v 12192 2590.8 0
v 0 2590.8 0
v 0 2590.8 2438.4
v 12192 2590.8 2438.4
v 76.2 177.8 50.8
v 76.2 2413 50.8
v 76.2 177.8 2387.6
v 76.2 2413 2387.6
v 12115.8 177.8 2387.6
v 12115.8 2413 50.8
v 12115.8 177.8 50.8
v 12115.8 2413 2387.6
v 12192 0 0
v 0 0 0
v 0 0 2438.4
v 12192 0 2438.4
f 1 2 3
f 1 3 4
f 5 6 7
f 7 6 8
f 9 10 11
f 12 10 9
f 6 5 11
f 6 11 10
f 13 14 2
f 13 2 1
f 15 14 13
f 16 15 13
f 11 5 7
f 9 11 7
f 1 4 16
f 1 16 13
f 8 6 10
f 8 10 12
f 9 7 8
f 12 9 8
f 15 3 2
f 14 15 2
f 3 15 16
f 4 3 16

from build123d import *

# Parameters (mm, degrees)
SKETCH1_W           = 12192
SKETCH1_H           = 2438.4
BOSS_EXTRUDE1_DEPTH = 2590.8
SKETCH2_W           = 2336.8
SKETCH2_H           = 2235.2
CUT_EXTRUDE1_DEPTH  = 12039.6


with BuildPart() as part:
    # Sketch1 → Boss-Extrude1 (new body)
    with BuildSketch(Plane(origin=(0, 0, 0), x_dir=(1, 0, 0), z_dir=(0, 1, 0))):
        with Locations((6096, -1219.2)):
            Rectangle(SKETCH1_W, SKETCH1_H)
    extrude(amount=BOSS_EXTRUDE1_DEPTH)

    # Sketch2 → Cut-Extrude1 (cut)
    with BuildSketch(Plane.ZY.offset(-76.2)):
        with Locations((1219.2, 1295.4)):
            Rectangle(SKETCH2_W, SKETCH2_H)
    extrude(amount=-CUT_EXTRUDE1_DEPTH, mode=Mode.SUBTRACT)


solid = part.part
